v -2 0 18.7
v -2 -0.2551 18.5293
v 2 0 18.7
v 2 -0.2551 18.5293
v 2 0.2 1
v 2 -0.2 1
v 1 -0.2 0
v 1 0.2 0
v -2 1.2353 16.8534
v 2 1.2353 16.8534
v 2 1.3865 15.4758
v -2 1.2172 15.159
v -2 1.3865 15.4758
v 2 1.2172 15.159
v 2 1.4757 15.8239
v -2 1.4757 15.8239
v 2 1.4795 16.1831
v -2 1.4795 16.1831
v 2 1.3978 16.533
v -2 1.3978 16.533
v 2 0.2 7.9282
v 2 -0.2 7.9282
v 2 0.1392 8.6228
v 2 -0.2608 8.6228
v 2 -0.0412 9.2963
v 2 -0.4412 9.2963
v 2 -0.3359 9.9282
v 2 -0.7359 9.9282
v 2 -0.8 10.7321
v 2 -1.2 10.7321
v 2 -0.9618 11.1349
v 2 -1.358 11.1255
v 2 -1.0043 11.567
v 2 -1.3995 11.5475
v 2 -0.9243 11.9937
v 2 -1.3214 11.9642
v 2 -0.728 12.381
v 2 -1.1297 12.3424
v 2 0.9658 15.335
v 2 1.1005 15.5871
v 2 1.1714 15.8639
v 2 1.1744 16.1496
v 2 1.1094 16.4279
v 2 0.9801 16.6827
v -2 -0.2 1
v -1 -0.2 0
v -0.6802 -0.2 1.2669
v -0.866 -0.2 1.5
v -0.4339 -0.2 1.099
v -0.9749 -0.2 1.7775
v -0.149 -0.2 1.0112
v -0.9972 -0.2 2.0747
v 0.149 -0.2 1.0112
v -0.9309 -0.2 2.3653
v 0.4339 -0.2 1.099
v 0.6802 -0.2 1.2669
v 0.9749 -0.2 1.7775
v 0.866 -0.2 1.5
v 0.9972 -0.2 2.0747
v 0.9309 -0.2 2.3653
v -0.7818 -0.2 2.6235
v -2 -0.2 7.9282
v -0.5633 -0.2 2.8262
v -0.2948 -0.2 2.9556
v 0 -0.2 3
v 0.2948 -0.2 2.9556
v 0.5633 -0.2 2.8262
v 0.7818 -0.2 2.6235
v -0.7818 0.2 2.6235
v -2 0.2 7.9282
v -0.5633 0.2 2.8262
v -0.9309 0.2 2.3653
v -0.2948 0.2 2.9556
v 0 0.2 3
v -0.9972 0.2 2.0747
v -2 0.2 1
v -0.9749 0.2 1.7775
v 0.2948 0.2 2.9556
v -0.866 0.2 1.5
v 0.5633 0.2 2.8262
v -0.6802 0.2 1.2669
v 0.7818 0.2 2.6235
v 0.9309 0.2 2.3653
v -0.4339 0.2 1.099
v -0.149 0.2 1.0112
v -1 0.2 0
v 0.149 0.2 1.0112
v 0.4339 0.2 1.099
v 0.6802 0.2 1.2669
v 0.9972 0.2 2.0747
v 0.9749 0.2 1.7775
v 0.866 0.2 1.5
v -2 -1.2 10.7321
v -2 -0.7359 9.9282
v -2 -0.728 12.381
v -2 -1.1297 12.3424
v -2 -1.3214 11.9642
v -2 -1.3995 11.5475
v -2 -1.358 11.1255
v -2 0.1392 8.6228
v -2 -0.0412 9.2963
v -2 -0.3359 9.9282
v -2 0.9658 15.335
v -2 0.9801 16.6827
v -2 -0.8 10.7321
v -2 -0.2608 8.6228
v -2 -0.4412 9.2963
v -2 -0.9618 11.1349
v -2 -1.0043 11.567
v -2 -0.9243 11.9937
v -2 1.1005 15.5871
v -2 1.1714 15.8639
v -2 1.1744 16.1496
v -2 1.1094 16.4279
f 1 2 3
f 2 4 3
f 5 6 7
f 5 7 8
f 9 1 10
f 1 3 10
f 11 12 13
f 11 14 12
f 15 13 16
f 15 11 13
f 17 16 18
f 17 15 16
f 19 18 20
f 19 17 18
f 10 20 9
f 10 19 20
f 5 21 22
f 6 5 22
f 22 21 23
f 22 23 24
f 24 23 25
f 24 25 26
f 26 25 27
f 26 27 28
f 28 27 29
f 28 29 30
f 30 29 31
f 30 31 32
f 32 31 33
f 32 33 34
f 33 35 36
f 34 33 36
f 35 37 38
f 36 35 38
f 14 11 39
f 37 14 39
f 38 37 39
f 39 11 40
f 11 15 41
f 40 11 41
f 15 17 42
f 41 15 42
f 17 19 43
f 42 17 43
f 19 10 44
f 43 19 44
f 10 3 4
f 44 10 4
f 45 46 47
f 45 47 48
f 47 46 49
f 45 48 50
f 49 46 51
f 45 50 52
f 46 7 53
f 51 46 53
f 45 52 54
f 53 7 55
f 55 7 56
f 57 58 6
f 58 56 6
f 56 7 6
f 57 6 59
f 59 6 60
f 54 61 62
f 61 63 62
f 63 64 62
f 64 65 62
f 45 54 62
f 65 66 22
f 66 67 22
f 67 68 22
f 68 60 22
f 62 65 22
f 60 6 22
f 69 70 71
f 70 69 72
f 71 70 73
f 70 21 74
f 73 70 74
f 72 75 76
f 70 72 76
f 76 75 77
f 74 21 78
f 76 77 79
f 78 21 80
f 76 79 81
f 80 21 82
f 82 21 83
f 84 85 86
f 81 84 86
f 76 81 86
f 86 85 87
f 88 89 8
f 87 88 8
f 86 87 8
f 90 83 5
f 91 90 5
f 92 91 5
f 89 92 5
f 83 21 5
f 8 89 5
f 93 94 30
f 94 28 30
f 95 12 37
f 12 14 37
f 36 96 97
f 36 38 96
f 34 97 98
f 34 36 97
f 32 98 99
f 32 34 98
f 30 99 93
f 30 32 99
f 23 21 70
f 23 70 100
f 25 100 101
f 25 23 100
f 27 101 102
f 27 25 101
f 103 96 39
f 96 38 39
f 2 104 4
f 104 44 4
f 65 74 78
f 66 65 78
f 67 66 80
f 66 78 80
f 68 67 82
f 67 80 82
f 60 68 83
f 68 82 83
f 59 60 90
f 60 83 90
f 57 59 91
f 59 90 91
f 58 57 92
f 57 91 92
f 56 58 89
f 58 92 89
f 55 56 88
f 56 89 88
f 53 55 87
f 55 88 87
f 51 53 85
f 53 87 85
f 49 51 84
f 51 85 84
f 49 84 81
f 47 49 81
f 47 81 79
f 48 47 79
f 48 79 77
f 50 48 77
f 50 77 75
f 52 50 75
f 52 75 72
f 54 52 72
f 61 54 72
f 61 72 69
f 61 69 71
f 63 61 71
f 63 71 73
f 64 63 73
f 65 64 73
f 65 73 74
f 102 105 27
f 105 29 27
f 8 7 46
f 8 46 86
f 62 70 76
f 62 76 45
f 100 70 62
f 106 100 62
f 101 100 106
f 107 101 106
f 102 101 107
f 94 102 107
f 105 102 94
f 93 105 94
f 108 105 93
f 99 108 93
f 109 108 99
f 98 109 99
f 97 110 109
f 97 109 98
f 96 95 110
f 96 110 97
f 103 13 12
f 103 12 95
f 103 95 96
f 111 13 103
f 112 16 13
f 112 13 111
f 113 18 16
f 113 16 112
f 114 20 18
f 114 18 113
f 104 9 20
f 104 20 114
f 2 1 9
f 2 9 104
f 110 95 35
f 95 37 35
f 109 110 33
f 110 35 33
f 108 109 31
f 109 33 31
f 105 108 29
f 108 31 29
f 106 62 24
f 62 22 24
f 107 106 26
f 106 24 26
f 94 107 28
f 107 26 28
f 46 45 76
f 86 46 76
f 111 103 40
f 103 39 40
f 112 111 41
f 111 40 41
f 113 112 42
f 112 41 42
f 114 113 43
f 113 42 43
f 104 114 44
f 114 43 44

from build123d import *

# Parameters (mm, degrees)
PAD001_DEPTH = 2
SKETCH002_R  = 1
POCKET_DEPTH = 5
CHAMFER_SIZE = 1


with BuildPart() as part:
    # Sketch001 → Pad001 (new body, symmetric)
    with BuildSketch(Plane.YZ):
        with BuildLine():
            Line((-0.2, 0), (-0.2, 7.928203))
            ThreePointArc((-0.2, 7.928203), (-0.336297, 8.963479), (-0.735898, 9.928203))
            Line((-0.735898, 9.928203), (-1.2, 10.732051))
            ThreePointArc((-1.12969, 12.342415), (-1.399534, 11.54748), (-1.2, 10.732051))
            Line((-1.12969, 12.342415), (0.965775, 15.335049))
            ThreePointArc((0.965775, 15.335049), (1.181471, 16.006654), (0.980132, 16.682702))
            Line((0.980132, 16.682702), (-0.255119, 18.529347))
            Line((-0.255119, 18.529347), (0, 18.7))
            Line((0, 18.7), (1.235251, 16.853356))
            ThreePointArc((1.2172, 15.158999), (1.488387, 16.003385), (1.235251, 16.853356))
            Line((1.2172, 15.158999), (-0.728007, 12.380955))
            ThreePointArc((-0.728007, 12.380955), (-1.00431, 11.566995), (-0.8, 10.732051))
            Line((-0.8, 10.732051), (-0.335898, 9.928203))
            ThreePointArc((0.2, 7.928203), (0.063703, 8.963479), (-0.335898, 9.928203))
            Line((0.2, 7.928203), (0.2, 0))
            Line((-0.2, 0), (0.2, 0))
        make_face()
    extrude(amount=PAD001_DEPTH, both=True)

    # Sketch002 (on Face1 of Pad001) → Pocket (cut)
    with BuildSketch(Plane.ZX.offset(0.2)):
        with Locations((2, 0)):
            Circle(SKETCH002_R)
    extrude(amount=-POCKET_DEPTH, mode=Mode.SUBTRACT)

    # Chamfer
    chamfer_edges = [part.edges().sort_by_distance(p)[0] for p in [
        (2, 0, 0),
        (-2, 0, 0),
    ]]
    chamfer(chamfer_edges, length=CHAMFER_SIZE)


solid = part.part
